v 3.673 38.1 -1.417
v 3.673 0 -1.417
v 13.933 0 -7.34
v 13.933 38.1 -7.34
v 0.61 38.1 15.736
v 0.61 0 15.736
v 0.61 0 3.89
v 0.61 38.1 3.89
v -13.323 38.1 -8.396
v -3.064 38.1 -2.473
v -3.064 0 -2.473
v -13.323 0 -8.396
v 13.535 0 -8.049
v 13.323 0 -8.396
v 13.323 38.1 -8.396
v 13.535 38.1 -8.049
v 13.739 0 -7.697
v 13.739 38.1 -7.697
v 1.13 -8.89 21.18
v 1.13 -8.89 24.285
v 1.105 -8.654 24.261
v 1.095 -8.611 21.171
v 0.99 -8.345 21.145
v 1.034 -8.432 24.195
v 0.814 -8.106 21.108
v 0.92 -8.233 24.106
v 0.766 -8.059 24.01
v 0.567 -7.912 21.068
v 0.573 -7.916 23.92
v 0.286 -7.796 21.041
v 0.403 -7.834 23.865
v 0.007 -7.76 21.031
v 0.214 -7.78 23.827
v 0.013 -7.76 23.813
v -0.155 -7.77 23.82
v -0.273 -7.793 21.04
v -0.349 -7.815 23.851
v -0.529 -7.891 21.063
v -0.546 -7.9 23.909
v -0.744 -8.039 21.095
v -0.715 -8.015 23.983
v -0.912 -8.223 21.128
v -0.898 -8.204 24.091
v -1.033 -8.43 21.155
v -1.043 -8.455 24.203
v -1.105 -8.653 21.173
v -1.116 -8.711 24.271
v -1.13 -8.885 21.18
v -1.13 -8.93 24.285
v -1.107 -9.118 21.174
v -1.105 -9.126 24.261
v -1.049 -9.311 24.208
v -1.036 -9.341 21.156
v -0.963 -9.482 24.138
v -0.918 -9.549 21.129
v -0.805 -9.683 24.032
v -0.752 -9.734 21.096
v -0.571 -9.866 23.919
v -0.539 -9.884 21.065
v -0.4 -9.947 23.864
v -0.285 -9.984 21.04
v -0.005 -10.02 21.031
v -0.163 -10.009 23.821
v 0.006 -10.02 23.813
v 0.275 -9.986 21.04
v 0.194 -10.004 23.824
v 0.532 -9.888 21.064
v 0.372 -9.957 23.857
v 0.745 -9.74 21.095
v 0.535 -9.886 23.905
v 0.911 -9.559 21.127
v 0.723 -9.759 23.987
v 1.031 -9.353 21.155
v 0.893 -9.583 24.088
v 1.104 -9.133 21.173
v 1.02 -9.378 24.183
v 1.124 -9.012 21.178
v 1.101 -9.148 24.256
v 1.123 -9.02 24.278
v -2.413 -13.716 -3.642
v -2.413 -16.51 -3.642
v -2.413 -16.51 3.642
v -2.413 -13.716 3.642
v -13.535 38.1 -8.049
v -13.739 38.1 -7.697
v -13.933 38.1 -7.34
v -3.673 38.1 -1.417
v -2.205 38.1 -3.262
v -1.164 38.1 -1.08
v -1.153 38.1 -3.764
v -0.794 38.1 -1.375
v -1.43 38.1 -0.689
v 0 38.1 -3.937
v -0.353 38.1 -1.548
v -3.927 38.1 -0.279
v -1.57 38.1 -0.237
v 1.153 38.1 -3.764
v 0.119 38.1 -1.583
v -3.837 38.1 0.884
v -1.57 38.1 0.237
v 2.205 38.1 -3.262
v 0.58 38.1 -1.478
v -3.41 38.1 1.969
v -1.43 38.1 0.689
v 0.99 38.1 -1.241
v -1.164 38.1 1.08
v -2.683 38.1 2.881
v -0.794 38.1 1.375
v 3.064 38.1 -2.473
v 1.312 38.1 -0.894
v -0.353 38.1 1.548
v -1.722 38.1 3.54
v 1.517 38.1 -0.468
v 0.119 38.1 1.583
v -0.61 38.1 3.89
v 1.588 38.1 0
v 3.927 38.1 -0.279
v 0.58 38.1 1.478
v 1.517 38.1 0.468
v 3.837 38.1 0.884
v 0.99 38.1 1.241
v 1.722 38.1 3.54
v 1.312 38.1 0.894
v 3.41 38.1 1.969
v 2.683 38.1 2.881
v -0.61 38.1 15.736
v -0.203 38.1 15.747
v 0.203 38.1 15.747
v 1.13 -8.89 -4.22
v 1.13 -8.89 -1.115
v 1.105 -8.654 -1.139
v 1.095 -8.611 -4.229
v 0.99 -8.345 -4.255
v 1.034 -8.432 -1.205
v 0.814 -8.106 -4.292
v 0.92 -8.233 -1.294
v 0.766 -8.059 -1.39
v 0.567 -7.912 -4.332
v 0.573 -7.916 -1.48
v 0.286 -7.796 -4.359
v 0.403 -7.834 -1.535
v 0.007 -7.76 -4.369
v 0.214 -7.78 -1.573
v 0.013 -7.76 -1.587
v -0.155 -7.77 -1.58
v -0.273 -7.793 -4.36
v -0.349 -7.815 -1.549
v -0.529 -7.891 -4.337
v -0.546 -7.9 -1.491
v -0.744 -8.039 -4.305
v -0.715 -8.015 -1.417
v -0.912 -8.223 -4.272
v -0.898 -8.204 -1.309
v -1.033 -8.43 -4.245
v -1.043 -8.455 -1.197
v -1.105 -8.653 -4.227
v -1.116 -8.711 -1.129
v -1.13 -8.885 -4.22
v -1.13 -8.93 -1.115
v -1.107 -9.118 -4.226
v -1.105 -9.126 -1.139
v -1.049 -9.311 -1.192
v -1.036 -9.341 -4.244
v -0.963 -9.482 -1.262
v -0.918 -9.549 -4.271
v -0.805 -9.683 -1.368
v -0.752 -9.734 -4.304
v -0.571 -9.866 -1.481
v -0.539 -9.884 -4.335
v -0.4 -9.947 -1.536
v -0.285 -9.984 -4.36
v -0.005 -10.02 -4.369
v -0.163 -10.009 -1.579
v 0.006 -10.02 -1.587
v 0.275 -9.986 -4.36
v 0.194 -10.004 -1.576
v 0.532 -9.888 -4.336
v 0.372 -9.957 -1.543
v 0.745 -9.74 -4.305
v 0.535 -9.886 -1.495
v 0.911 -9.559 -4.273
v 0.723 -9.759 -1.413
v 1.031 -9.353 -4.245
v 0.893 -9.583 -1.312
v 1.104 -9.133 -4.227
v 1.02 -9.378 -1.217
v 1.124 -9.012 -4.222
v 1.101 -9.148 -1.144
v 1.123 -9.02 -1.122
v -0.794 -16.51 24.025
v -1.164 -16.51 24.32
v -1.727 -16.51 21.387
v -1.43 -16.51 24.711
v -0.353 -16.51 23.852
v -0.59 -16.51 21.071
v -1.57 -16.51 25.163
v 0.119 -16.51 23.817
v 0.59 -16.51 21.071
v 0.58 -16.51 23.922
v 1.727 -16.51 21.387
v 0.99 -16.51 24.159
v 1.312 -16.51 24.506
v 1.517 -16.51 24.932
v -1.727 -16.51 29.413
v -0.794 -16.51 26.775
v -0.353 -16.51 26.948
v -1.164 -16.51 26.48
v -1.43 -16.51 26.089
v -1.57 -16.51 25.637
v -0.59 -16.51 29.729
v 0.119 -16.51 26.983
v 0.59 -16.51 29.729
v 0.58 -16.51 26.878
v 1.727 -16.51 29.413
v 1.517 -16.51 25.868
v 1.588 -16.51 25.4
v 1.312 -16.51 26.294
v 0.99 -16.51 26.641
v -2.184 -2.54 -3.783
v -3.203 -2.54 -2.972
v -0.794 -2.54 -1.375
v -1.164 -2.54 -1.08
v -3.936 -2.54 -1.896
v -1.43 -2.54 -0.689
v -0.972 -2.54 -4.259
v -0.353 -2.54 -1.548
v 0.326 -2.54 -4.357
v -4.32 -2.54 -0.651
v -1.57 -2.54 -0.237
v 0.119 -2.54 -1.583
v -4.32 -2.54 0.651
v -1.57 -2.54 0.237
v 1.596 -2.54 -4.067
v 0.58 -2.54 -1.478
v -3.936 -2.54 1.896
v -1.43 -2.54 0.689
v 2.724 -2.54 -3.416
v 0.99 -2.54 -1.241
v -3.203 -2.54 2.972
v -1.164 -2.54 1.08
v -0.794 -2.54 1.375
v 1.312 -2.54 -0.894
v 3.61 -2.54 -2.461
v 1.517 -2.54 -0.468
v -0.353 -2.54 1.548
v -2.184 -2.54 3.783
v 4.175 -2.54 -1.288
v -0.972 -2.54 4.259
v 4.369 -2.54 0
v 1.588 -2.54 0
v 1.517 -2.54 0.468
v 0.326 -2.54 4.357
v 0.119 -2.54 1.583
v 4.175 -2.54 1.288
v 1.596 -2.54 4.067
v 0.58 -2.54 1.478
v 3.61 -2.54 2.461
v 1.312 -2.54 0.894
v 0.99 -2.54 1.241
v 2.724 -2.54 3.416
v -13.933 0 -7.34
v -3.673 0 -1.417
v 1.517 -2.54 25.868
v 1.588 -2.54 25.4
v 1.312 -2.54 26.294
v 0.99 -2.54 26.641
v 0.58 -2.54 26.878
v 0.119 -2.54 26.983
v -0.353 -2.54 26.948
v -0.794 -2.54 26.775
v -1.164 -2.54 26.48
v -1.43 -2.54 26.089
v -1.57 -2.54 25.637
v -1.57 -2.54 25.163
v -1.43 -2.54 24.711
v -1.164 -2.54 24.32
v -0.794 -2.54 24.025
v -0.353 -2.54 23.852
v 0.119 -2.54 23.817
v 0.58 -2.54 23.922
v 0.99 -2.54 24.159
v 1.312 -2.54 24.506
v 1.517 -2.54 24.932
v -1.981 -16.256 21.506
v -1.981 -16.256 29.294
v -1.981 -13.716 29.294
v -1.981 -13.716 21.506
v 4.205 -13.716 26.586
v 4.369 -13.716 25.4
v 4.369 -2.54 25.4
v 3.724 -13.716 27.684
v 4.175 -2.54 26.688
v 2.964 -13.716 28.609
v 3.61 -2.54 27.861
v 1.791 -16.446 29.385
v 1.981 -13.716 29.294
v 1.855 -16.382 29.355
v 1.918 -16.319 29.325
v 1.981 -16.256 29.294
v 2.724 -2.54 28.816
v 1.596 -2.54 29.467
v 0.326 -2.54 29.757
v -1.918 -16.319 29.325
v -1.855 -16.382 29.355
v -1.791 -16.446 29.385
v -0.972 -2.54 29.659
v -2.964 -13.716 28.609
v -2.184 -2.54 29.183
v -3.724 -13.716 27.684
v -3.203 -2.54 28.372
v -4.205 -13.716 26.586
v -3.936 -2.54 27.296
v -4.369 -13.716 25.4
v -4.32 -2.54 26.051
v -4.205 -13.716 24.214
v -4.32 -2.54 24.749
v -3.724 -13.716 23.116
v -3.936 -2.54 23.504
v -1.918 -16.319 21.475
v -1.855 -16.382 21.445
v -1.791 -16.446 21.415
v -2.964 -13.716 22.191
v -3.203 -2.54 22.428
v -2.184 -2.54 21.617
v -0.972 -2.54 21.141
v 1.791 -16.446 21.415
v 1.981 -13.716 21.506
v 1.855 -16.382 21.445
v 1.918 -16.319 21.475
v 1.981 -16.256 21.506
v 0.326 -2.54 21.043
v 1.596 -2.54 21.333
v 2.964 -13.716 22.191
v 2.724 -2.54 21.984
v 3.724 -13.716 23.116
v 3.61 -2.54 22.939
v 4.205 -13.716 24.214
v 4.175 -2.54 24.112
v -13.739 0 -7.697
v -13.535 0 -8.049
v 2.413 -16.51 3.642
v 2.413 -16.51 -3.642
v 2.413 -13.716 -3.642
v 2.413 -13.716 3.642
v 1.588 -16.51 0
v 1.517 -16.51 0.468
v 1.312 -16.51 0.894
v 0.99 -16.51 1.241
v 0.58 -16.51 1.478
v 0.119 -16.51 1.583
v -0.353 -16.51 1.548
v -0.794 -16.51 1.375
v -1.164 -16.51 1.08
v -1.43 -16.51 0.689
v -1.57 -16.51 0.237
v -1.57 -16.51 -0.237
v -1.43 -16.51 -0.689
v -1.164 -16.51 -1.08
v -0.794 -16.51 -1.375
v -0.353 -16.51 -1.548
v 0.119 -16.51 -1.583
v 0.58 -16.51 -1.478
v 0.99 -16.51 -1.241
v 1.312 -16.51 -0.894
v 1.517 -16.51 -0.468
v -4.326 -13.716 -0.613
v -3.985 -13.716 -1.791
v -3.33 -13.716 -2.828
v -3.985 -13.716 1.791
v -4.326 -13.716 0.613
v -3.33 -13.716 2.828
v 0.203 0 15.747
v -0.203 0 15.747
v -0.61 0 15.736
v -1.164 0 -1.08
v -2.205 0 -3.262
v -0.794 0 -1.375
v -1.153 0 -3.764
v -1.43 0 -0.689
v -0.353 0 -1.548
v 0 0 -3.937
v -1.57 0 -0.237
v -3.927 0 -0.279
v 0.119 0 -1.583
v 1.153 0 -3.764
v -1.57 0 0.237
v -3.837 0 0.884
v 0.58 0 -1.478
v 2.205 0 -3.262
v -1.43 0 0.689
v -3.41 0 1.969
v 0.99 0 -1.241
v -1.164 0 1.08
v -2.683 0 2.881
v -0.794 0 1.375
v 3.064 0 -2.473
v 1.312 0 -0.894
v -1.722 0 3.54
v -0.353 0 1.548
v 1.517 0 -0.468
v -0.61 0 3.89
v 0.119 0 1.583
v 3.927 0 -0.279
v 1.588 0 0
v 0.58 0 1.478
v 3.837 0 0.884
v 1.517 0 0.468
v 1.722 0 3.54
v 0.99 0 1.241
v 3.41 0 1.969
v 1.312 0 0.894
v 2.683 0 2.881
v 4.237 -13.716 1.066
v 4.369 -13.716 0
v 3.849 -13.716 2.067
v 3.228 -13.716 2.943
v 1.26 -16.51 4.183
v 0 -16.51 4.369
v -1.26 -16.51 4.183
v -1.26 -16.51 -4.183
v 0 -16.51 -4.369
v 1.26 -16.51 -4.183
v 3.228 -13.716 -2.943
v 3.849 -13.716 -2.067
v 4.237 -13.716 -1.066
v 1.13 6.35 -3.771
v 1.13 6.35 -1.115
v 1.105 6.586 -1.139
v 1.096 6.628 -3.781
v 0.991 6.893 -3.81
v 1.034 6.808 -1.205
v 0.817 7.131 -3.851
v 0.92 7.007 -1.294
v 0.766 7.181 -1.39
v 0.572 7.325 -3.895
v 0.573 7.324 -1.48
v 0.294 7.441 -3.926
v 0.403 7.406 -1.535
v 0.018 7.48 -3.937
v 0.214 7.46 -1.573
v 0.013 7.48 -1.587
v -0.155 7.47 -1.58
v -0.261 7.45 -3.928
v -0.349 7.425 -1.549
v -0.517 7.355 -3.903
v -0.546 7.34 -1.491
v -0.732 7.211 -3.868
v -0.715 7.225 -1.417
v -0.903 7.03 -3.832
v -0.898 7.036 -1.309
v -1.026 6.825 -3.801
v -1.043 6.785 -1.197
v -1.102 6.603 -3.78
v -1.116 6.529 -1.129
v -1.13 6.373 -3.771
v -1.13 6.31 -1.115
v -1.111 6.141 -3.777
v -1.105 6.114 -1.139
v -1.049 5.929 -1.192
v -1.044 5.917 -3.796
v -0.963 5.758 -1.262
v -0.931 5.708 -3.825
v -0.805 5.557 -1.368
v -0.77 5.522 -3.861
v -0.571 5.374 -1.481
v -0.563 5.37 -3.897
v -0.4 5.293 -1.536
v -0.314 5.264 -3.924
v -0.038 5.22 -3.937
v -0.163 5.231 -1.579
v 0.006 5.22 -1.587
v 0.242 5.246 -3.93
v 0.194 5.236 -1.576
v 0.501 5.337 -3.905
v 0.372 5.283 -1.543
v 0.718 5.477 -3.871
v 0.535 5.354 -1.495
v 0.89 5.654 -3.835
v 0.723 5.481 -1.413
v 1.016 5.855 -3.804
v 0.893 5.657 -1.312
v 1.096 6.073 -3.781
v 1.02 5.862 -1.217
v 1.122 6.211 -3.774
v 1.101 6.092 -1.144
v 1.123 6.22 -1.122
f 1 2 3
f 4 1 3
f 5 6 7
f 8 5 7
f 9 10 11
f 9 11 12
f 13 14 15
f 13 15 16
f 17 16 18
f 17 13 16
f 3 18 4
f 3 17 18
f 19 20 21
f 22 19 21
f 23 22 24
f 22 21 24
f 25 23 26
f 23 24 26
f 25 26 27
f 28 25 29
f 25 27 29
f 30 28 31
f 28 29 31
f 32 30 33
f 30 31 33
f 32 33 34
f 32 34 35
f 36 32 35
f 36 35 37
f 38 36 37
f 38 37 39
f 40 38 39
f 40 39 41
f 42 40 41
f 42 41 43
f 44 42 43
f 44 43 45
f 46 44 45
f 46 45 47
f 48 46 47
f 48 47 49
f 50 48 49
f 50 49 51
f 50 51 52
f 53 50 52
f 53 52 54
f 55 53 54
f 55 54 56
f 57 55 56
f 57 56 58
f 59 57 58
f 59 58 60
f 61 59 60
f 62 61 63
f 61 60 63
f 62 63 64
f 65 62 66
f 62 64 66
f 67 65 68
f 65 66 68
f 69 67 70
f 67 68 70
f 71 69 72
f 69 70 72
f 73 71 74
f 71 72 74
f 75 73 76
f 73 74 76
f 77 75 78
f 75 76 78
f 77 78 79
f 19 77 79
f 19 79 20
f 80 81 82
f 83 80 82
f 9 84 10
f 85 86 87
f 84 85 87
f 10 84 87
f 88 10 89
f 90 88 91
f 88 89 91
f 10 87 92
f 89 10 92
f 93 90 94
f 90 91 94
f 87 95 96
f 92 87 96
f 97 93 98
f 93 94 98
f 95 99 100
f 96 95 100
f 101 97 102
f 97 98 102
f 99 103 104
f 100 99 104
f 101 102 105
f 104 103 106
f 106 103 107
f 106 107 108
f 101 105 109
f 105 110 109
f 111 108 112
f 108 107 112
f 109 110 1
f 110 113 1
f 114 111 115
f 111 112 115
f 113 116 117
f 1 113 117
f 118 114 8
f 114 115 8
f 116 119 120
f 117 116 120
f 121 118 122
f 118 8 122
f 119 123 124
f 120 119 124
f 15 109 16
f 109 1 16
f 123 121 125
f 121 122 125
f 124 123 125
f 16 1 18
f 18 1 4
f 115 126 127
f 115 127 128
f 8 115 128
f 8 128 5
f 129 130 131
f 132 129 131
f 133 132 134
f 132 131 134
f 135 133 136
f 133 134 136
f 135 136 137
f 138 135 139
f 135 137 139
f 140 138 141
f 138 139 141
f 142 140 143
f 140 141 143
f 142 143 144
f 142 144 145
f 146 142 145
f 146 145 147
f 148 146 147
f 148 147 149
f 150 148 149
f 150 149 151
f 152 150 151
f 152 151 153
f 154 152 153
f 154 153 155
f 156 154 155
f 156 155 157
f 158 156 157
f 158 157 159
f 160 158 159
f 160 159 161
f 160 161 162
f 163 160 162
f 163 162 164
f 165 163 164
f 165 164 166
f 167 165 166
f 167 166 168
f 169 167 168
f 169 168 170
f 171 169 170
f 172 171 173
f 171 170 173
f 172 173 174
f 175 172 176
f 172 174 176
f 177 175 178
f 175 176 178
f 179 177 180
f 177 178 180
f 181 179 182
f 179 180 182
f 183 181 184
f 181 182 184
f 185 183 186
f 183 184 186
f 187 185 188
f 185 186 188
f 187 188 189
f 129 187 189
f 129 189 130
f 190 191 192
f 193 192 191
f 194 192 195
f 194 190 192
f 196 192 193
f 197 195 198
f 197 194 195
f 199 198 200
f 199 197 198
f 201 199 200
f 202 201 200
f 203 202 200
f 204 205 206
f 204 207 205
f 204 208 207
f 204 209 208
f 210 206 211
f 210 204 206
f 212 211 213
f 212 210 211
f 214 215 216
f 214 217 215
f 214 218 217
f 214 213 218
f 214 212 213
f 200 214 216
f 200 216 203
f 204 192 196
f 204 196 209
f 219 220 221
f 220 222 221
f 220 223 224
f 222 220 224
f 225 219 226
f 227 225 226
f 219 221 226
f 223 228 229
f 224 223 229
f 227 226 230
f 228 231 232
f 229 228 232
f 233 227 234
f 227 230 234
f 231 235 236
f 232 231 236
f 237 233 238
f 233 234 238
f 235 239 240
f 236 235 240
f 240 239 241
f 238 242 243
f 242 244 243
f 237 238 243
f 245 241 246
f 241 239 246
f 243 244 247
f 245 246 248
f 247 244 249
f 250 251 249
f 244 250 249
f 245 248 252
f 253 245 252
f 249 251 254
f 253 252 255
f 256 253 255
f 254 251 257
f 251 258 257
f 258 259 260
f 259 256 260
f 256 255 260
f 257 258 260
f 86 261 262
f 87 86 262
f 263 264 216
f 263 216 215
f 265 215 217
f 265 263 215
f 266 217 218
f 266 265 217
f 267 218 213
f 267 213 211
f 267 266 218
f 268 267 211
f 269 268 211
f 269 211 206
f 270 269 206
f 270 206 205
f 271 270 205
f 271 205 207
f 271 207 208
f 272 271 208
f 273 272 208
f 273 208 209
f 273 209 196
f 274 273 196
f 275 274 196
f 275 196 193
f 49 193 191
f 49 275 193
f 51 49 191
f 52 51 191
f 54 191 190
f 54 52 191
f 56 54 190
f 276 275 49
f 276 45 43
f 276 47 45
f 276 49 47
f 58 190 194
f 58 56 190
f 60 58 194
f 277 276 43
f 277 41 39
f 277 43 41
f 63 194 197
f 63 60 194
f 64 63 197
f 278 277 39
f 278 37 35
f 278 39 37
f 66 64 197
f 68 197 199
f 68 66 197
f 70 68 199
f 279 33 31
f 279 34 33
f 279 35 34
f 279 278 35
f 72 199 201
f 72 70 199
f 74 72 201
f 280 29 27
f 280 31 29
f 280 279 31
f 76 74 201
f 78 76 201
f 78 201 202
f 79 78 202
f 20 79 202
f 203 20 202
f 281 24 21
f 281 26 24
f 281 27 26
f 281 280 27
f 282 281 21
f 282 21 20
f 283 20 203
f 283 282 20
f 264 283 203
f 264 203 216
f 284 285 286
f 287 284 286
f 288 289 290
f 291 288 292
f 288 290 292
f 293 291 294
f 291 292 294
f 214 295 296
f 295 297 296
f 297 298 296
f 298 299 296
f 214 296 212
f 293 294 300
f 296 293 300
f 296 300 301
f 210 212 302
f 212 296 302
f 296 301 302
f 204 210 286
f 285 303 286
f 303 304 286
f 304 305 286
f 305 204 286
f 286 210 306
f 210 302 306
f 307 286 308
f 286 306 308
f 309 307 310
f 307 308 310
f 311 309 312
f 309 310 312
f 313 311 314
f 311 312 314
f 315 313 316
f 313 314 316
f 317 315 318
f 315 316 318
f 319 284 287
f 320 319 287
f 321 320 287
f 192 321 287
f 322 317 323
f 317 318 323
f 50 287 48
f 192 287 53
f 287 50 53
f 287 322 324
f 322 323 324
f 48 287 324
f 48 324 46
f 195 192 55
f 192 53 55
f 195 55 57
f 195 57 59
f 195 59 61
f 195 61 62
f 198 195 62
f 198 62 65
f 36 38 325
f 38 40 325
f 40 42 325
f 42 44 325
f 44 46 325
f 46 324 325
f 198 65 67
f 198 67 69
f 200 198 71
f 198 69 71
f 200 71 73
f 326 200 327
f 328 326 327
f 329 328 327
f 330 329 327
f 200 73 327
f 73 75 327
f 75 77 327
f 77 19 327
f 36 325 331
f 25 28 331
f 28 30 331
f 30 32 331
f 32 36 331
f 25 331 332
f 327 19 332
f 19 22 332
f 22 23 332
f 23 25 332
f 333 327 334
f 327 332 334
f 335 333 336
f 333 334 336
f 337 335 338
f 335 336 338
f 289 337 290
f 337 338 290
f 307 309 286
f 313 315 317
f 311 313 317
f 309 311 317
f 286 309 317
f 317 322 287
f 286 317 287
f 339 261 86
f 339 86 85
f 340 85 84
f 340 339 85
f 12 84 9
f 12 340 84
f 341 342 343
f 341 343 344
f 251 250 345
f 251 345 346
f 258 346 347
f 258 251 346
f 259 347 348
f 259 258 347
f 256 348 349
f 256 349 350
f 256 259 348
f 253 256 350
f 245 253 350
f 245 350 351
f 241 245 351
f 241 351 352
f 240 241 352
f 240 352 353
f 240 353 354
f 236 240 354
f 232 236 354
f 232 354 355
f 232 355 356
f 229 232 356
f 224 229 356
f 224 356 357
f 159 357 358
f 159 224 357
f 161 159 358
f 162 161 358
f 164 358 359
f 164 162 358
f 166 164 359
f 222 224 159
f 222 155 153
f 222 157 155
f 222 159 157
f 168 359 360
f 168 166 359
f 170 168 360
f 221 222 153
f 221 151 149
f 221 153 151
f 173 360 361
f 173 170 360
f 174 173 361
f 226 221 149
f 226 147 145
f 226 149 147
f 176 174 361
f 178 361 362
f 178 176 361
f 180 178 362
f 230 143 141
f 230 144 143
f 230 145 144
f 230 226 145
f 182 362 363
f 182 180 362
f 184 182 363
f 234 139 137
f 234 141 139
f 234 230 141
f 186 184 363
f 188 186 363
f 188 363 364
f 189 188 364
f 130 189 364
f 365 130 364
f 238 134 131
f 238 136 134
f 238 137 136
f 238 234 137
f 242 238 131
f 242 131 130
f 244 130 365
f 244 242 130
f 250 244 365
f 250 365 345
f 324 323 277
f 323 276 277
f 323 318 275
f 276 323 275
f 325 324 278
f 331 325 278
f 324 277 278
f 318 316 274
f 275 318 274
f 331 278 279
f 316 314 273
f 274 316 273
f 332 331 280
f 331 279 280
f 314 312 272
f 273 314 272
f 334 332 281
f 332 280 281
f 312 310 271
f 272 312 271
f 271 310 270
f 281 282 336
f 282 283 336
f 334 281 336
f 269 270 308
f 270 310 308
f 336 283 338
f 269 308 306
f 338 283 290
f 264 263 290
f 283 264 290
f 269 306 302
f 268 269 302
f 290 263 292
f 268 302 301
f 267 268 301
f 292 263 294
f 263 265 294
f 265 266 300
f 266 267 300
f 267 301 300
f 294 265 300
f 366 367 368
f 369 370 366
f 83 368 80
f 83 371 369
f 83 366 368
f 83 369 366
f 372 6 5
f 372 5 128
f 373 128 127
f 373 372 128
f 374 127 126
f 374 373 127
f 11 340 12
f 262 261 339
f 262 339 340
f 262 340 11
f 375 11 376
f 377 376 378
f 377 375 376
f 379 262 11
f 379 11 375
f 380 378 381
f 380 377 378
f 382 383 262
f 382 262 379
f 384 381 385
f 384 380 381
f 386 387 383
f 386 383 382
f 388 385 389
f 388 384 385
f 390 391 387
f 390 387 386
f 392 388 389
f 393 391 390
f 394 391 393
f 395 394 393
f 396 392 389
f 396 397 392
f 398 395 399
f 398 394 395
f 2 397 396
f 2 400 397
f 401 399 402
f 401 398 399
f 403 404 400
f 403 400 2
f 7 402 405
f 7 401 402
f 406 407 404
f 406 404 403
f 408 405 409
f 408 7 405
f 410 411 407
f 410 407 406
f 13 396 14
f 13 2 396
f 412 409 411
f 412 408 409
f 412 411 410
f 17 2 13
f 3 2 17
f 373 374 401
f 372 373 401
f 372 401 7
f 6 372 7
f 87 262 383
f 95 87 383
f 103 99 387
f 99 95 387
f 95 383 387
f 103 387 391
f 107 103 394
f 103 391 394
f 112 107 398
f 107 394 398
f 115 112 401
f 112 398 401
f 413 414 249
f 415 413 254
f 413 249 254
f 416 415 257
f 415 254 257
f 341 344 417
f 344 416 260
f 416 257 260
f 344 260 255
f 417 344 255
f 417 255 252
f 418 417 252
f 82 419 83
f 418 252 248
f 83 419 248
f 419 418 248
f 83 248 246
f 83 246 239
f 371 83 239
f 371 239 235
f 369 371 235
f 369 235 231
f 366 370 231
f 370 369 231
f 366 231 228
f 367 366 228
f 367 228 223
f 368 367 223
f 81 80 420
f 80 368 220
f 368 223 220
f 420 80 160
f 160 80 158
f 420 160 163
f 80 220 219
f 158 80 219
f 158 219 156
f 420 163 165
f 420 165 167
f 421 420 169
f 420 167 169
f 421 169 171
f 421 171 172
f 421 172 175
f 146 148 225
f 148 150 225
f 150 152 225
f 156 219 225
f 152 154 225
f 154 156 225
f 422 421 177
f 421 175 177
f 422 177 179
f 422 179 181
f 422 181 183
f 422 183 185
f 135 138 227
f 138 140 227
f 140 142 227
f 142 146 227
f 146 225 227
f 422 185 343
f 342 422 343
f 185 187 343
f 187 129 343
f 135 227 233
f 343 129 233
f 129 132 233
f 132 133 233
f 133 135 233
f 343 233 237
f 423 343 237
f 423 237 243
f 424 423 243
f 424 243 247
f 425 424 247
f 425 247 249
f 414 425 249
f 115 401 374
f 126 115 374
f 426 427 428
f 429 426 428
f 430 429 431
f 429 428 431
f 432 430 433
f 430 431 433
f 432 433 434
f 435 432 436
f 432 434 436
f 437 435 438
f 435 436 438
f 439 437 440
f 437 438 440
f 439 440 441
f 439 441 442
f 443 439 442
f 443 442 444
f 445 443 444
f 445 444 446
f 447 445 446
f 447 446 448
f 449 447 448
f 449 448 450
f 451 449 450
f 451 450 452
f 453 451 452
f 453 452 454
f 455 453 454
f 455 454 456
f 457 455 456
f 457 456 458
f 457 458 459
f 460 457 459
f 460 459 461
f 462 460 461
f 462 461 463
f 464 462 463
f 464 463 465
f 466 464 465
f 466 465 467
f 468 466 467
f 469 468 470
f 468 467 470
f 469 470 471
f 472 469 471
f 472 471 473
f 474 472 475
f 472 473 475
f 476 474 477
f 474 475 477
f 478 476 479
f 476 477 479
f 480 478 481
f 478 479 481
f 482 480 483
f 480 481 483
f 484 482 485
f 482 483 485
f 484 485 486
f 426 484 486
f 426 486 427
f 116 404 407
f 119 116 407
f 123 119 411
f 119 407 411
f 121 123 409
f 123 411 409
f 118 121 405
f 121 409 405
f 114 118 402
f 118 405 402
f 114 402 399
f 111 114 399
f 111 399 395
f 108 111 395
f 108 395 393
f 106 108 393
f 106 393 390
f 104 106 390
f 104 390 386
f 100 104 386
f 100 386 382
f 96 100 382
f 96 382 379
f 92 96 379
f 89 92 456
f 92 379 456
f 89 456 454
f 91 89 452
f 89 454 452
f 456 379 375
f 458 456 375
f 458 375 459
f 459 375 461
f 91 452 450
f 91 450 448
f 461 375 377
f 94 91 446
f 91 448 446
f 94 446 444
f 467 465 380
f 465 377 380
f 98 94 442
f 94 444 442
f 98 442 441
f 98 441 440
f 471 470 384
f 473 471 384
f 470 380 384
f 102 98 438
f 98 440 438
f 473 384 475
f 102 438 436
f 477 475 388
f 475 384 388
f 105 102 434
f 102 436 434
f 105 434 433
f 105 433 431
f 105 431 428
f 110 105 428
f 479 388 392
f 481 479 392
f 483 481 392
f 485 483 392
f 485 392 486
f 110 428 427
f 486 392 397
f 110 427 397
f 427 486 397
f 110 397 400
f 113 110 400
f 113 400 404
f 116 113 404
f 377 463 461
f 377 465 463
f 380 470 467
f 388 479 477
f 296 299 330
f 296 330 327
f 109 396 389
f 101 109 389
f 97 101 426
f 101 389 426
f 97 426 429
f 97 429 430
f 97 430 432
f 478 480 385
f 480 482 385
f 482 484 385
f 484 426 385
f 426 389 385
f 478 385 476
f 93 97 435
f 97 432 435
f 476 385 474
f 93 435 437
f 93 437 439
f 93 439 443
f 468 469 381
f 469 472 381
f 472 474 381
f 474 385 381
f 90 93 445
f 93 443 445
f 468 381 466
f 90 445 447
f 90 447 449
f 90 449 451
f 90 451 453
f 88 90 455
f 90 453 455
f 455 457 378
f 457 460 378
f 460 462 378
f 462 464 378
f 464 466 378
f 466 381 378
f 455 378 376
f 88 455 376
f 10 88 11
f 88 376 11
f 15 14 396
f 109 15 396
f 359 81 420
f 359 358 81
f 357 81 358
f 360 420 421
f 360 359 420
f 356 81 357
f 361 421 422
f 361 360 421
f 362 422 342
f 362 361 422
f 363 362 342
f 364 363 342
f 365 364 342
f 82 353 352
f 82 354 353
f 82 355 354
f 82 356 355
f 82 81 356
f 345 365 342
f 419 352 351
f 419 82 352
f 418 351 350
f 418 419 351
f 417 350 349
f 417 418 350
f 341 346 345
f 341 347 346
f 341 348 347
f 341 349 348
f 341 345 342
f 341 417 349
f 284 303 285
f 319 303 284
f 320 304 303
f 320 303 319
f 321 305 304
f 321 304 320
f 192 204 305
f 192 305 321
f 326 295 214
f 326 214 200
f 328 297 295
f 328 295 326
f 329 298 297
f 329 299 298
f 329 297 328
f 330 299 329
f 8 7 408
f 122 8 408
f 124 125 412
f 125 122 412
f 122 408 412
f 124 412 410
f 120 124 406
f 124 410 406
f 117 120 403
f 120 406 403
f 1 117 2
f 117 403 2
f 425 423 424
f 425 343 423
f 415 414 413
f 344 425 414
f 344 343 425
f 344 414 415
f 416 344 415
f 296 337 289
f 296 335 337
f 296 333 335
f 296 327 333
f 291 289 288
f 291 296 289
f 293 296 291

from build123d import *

# Parameters (mm, degrees)
F0_R      = 15.748
F0_R_2    = 1.5875
F1_DEPTH  = 38.1
F4_DEPTH  = 40.641
F6_D      = 2.2606
F6_DEPTH  = 8.3970275197
F7_R      = 4.3688
F7_R_2    = 1.5875
F8_DEPTH  = 13.97
F10_W     = 7.4564515574
F10_H     = 24.0045413943
F11_DEPTH = 5.334
F13_D     = 2.2606
F13_DEPTH = 4.3698
F15_W     = 4.0957157816
F15_H     = 6.6450905805
F16_DEPTH = 38.1
F17_SIZE  = 0.254


with BuildPart() as f1:
    # F0 (on Front) → F1 (new body)
    with BuildSketch(Plane.XZ):
        Circle(F0_R)
        Circle(F0_R_2, mode=Mode.SUBTRACT)
    extrude(amount=-F1_DEPTH)

    # F3 (on offset) → F4 (cut, through all)
    with BuildSketch(Plane.XZ.offset(2.54)):
        with BuildLine():
            ThreePointArc((-3.6732221276, -1.416830336), (-3.4095420147, 1.9685), (-0.6096, 3.8895188443))
            Line((-0.6096, 3.8895188443), (-0.6096, 18.2243121161))
            ThreePointArc((-0.6096, 18.2243121161), (-15.7915443576, 9.1172523858), (-16.087517259, -8.5842269719))
            Line((-16.087517259, -8.5842269719), (-3.6732221276, -1.416830336))
        make_face()
        with BuildLine():
            Line((0.6096, 18.2243121161), (0.6096, 3.8895188443))
            ThreePointArc((0.6096, 3.8895188443), (3.4095420147, 1.9685), (3.6732221276, -1.416830336))
            Line((3.6732221276, -1.416830336), (16.087517259, -8.5842269719))
            ThreePointArc((16.087517259, -8.5842269719), (15.7915443576, 9.1172523858), (0.6096, 18.2243121161))
        make_face()
        with BuildLine():
            Line((15.477917259, -9.6400851442), (3.0636221276, -2.4726885083))
            ThreePointArc((3.0636221276, -2.4726885083), (0, -3.937), (-3.0636221276, -2.4726885083))
            Line((-3.0636221276, -2.4726885083), (-15.477917259, -9.6400851442))
            ThreePointArc((-15.477917259, -9.6400851442), (0, -18.2345047716), (15.477917259, -9.6400851442))
        make_face()
    extrude(amount=-F4_DEPTH, mode=Mode.SUBTRACT)

    # F6 (through all, one way)
    with BuildSketch(Plane.XY):
        with Locations((0, 6.35)):
            Circle(F6_D / 2)
    extrude(amount=-F6_DEPTH, mode=Mode.SUBTRACT)


with BuildPart() as f8:
    # F7 (on offset) → F8 (new body)
    with BuildSketch(Plane.XZ.offset(2.54)):
        Circle(F7_R)
        Circle(F7_R_2, mode=Mode.SUBTRACT)
    extrude(amount=F8_DEPTH)

    # F10 (on offset) → F11 (cut)
    with BuildSketch(Plane.XZ.offset(19.05)):
        with Locations((-6.1412257787, -0.9254051838)):
            Rectangle(F10_W, F10_H)
        with Locations((6.1412257787, -0.9254051838)):
            Rectangle(F10_W, F10_H)
    extrude(amount=-F11_DEPTH, mode=Mode.SUBTRACT)

    # F13 (through all, one way)
    with BuildSketch(Plane.XY):
        with Locations((0, -8.89)):
            Circle(F13_D / 2)
    extrude(amount=-F13_DEPTH, mode=Mode.SUBTRACT)


with BuildPart() as f14_1:
    # F14: copy of F8
    add(f8.part.moved(Location((0, 0, 25.4))))

    # F15 (on Top) → F16 (cut)
    with BuildSketch(Plane.XY):
        with Locations((-4.0290578908, -17.0385452903)):
            Rectangle(F15_W, F15_H)
        with Locations((4.0290578908, -17.0385452903)):
            Rectangle(F15_W, F15_H)
    extrude(amount=F16_DEPTH, mode=Mode.SUBTRACT)

    # F17
    f17_edges = [f14_1.edges().sort_by_distance(p)[0] for p in [
        (-1.9812, -16.51, 25.4),
        (1.9812, -16.51, 25.4),
    ]]
    chamfer(f17_edges, length=F17_SIZE)


solid = Compound([f1.part, f8.part, f14_1.part])
